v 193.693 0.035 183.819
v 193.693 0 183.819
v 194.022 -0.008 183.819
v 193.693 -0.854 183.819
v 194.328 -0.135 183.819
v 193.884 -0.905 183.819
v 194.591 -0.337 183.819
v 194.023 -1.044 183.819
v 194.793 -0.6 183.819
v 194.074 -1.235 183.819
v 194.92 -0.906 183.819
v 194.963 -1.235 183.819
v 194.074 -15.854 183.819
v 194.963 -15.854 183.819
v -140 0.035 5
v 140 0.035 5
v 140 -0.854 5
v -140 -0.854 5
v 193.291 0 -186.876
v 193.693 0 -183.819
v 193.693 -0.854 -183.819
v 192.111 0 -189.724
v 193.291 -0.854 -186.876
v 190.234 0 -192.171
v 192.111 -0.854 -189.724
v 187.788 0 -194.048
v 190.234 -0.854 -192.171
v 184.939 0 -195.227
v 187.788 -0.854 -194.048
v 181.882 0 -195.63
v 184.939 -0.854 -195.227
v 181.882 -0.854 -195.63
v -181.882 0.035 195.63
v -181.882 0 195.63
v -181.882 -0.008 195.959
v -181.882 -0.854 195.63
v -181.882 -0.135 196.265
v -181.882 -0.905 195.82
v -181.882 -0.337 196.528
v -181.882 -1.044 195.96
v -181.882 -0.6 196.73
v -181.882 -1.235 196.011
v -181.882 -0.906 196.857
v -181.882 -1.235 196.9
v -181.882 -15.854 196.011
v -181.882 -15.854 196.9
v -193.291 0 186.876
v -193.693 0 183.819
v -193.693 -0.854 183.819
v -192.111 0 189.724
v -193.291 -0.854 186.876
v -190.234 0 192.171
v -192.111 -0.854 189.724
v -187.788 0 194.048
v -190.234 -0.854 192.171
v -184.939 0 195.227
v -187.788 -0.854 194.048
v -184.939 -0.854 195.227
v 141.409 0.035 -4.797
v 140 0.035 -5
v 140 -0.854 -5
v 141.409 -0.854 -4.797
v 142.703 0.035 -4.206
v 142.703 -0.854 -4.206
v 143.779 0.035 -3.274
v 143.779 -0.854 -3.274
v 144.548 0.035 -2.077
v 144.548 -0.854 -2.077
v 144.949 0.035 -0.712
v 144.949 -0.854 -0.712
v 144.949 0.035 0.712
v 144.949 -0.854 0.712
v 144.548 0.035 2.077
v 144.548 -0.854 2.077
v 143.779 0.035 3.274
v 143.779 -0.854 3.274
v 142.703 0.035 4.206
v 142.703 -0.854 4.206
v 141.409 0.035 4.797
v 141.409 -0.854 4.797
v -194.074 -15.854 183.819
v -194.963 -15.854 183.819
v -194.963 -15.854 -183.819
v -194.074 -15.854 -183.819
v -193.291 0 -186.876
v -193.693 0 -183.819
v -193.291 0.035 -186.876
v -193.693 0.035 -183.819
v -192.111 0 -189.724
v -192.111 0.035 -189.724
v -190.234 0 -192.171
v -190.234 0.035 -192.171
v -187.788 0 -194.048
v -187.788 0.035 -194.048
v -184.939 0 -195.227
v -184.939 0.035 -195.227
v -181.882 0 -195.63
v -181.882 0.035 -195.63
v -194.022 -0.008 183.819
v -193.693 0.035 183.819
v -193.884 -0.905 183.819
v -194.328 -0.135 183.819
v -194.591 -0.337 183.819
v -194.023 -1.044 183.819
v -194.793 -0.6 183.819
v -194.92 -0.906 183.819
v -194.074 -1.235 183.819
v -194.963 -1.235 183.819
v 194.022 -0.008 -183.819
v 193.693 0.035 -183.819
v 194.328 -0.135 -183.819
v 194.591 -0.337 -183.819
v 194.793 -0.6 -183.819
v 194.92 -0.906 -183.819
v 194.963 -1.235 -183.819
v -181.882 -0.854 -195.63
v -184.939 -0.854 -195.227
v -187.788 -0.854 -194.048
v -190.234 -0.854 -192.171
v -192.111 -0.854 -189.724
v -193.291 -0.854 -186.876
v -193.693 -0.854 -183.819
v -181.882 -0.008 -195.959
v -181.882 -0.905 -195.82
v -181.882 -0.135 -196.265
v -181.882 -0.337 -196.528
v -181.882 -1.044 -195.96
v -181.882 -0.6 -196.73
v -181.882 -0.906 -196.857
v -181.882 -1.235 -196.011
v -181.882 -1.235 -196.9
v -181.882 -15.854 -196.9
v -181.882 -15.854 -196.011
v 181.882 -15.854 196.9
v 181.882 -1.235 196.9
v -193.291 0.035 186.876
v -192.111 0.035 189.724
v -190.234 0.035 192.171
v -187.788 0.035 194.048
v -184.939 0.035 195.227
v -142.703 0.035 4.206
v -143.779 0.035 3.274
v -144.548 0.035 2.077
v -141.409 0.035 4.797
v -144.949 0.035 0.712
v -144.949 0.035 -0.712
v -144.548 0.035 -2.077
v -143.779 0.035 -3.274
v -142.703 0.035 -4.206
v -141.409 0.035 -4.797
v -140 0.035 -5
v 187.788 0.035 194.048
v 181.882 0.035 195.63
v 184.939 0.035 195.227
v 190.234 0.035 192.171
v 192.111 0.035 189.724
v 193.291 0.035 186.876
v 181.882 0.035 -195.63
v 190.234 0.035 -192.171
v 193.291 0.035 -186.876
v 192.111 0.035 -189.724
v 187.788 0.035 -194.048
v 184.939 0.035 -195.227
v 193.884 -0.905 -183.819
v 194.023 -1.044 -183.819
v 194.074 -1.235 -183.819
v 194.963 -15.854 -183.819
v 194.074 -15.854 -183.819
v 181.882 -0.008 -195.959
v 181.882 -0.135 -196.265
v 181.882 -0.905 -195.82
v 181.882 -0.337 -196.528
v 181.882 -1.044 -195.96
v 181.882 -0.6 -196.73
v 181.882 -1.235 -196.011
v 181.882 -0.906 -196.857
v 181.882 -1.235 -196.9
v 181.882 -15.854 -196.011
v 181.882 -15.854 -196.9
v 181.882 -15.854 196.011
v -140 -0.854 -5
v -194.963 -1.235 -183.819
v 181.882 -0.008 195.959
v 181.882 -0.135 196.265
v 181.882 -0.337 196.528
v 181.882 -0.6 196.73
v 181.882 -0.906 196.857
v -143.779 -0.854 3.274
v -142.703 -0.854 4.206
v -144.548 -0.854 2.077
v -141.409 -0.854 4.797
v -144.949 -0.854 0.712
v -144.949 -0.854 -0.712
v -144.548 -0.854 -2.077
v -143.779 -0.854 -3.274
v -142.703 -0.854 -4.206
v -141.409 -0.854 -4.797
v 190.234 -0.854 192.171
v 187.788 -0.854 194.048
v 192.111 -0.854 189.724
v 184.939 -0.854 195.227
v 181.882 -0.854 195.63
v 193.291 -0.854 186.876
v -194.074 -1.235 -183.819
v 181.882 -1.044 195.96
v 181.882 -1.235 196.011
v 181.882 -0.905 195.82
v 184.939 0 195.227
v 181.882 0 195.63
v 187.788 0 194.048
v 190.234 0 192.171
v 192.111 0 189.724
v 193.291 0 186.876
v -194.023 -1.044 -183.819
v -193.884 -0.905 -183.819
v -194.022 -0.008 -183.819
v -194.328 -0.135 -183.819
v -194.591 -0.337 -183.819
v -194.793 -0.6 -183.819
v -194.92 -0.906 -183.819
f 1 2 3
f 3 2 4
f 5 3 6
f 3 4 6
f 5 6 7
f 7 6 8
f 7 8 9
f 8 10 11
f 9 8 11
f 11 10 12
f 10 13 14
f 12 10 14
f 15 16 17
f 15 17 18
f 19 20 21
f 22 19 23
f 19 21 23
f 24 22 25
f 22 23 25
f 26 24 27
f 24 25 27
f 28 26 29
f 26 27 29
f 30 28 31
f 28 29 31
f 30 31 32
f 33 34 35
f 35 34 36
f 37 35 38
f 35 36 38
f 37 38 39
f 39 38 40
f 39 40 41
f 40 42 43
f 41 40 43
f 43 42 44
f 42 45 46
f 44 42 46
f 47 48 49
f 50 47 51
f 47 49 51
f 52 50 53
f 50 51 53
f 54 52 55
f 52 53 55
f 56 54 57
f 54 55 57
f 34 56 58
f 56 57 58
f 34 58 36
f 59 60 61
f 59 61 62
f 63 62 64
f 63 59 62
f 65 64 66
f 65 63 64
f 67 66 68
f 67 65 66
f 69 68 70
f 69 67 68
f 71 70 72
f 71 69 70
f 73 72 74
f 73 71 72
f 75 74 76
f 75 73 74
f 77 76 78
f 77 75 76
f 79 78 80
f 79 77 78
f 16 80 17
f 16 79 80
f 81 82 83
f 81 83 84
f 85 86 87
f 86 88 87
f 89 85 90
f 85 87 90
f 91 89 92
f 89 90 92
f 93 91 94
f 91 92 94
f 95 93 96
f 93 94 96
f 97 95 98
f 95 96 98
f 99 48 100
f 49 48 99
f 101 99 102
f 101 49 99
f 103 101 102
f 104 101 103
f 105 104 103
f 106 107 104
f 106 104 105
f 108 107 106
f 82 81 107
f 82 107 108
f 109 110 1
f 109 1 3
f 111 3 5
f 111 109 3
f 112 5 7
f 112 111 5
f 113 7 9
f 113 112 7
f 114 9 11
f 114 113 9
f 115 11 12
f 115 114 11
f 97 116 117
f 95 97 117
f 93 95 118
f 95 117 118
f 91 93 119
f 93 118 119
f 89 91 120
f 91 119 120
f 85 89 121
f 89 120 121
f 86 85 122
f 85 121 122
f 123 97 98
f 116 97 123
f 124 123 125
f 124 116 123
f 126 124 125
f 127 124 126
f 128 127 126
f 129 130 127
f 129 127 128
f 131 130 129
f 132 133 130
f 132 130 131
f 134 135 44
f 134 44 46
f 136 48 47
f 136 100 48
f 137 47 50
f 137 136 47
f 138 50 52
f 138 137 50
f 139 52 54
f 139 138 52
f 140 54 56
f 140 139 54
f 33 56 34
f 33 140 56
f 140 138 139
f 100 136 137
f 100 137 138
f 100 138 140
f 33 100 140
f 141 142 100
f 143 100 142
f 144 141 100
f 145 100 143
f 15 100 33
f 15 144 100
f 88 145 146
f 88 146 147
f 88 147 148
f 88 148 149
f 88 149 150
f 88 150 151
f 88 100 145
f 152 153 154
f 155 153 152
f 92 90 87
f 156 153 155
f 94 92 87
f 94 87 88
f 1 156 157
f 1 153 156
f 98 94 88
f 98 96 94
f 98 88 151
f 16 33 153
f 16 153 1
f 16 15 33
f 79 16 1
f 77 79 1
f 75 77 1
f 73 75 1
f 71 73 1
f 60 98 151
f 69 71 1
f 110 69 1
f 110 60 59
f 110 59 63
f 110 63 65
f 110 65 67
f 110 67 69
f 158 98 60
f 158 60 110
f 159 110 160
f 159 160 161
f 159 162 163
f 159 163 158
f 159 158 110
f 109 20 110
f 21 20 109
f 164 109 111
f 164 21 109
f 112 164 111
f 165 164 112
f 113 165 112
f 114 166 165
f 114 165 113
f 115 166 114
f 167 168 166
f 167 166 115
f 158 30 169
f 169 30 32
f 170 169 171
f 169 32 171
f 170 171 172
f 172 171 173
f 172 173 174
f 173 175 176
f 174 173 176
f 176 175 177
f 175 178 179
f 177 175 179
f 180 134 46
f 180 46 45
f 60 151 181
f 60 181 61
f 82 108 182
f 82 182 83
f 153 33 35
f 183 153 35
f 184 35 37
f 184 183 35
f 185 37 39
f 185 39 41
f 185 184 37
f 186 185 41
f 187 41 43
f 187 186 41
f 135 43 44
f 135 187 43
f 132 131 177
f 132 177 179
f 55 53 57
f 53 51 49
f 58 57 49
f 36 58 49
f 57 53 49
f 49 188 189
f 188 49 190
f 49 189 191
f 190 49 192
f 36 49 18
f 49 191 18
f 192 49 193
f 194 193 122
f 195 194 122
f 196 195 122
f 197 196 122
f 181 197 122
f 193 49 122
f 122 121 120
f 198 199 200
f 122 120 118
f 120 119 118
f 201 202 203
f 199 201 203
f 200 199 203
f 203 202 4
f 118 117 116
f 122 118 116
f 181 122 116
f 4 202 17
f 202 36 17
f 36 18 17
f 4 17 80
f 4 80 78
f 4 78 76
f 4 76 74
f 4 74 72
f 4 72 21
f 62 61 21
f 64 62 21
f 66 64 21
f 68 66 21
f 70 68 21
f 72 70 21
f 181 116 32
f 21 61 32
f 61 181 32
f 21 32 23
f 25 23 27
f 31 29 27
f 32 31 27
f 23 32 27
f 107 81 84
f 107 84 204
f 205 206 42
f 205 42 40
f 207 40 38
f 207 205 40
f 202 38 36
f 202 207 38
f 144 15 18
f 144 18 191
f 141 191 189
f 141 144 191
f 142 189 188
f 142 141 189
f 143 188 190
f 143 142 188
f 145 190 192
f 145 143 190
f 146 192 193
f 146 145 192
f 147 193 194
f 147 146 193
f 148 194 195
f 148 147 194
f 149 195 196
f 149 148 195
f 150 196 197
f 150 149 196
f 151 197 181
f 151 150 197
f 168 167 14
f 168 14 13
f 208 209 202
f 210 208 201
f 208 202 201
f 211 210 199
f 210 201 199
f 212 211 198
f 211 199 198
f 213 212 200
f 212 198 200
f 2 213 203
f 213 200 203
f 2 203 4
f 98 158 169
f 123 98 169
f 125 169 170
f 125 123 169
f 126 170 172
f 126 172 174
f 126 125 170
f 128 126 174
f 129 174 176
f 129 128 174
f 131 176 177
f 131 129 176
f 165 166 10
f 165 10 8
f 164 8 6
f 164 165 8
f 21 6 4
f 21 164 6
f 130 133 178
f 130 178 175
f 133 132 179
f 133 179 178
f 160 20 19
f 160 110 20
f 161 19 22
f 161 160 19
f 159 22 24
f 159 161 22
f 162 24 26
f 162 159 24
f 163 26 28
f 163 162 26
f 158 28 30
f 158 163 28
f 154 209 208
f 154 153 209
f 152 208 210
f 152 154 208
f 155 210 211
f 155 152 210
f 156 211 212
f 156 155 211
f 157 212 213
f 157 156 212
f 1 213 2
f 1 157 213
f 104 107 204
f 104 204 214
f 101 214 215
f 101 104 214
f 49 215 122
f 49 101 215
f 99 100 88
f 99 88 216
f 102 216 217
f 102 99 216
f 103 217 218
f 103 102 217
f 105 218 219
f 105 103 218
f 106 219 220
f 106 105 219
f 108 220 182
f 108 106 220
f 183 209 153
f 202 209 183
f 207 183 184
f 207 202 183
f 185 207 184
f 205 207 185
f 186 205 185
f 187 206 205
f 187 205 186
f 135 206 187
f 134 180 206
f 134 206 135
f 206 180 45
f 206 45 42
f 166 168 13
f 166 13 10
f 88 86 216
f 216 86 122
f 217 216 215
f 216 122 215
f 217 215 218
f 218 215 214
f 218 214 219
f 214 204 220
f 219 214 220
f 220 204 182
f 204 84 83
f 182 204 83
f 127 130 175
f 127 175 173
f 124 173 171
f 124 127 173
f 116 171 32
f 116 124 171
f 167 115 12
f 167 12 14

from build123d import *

# Parameters (mm, degrees)
SKETCH1_W                 = 387.38683
SKETCH1_H                 = 391.2598474
BOSS_EXTRUDE1_DEPTH       = 0.035
FILLET1_R                 = 11.811
CONVERT_SOLID1_START      = -0.854
CONVERT_SOLID1_DEPTH      = 0.854
CUT_EXTRUDE1_DEPTH        = 0.889
EDGE_FLANGE1_DEPTH        = 367.6378474
EDGE_FLANGE1_BEND_DEPTH   = 363.76483
EDGE_FLANGE1_BEND_2_DEPTH = 367.6378474
EDGE_FLANGE1_BEND_3_DEPTH = 363.76483


# Read off the part's stored shape, not the designer's step: Convert-Solid1
# Sheet-metal steps are written as plain solids
with BuildPart() as part:
    # Sketch1 → Boss-Extrude1 (new body)
    with BuildSketch(Plane(origin=(0, 0, 0), x_dir=(1, 0, 0), z_dir=(0, 1, 0))):
        Rectangle(SKETCH1_W, SKETCH1_H)
    extrude(amount=BOSS_EXTRUDE1_DEPTH)

    # Fillet1
    fillet1_edges = [part.edges().sort_by_distance(p)[0] for p in [
        (193.693415, 0.0175, -195.6299237),
        (193.693415, 0.0175, 195.6299237),
        (-193.693415, 0.0175, 195.6299237),
        (-193.693415, 0.0175, -195.6299237),
    ]]
    fillet(fillet1_edges, radius=FILLET1_R)

    # Convert-Solid1 outline → Convert-Solid1 (add)
    with BuildSketch(Plane(origin=(0, 0, 0), x_dir=(1, 0, 0), z_dir=(0, 1, 0)).offset(CONVERT_SOLID1_START)):
        with BuildLine():
            ThreePointArc((193.693415, 183.8189237), (190.234053193, 192.170561893), (181.882415, 195.6299237))
            Line((181.882415, 195.6299237), (-181.882415, 195.6299237))
            ThreePointArc((-181.882415, 195.6299237), (-190.234053193, 192.170561893), (-193.693415, 183.8189237))
            Line((-193.693415, 183.8189237), (-193.693415, -183.8189237))
            ThreePointArc((-193.693415, -183.8189237), (-190.234053193, -192.170561893), (-181.882415, -195.6299237))
            Line((-181.882415, -195.6299237), (181.882415, -195.6299237))
            ThreePointArc((181.882415, -195.6299237), (190.234053193, -192.170561893), (193.693415, -183.8189237))
            Line((193.693415, -183.8189237), (193.693415, 183.8189237))
        make_face()
    extrude(amount=CONVERT_SOLID1_DEPTH)

    # Sketch2 → Cut-Extrude1 (cut)
    with BuildSketch(Plane(origin=(0, 0.035, 0), x_dir=(1, 0, 0), z_dir=(0, 1, 0))):
        with BuildLine():
            Line((-140, 5), (140, 5))
            ThreePointArc((140, 5), (145, 0), (140, -5))
            Line((140, -5), (-140, -5))
            ThreePointArc((-140, -5), (-145, 0), (-140, 5))
        make_face()
    extrude(amount=-CUT_EXTRUDE1_DEPTH, mode=Mode.SUBTRACT)

    # Edge-Flange1 section (across the edge) → Edge-Flange1 (add)
    with BuildSketch(Plane(origin=(-194.074415, -0.854, 183.8189237), x_dir=(1, 0, 0), z_dir=(0, 0, -1))):
        with BuildLine():
            Line((-0.889, 0.381), (-0.889, 15))
            Line((-0.889, 15), (0, 15))
            Line((0, 15), (0, 0.381))
            ThreePointArc((0, 0.381), (0.111592316, 0.111592316), (0.381, 0))
            Line((0.381, 0), (0.381, -0.889))
            ThreePointArc((0.381, -0.889), (-0.517025612, -0.517025612), (-0.889, 0.381))
        make_face()
    extrude(amount=EDGE_FLANGE1_DEPTH)

    # Edge-Flange1 section 2 (across the edge) → Edge-Flange1 bend (add)
    with BuildSketch(Plane(origin=(181.882415, -0.854, 196.0109237), x_dir=(0, 0, -1), z_dir=(-1, 0, 0))):
        with BuildLine():
            Line((-0.889, 0.381), (-0.889, 15))
            Line((-0.889, 15), (0, 15))
            Line((0, 15), (0, 0.381))
            ThreePointArc((0, 0.381), (0.111592316, 0.111592316), (0.381, 0))
            Line((0.381, 0), (0.381, -0.889))
            ThreePointArc((0.381, -0.889), (-0.517025612, -0.517025612), (-0.889, 0.381))
        make_face()
    extrude(amount=EDGE_FLANGE1_BEND_DEPTH)

    # Edge-Flange1 section 3 (across the edge) → Edge-Flange1 bend 2 (add)
    with BuildSketch(Plane(origin=(194.074415, -0.854, -183.8189237), x_dir=(-1, 0, 0), z_dir=(0, 0, 1))):
        with BuildLine():
            Line((-0.889, 0.381), (-0.889, 15))
            Line((-0.889, 15), (0, 15))
            Line((0, 15), (0, 0.381))
            ThreePointArc((0, 0.381), (0.111592316, 0.111592316), (0.381, 0))
            Line((0.381, 0), (0.381, -0.889))
            ThreePointArc((0.381, -0.889), (-0.517025612, -0.517025612), (-0.889, 0.381))
        make_face()
    extrude(amount=EDGE_FLANGE1_BEND_2_DEPTH)

    # Edge-Flange1 section 4 (across the edge) → Edge-Flange1 bend 3 (add)
    with BuildSketch(Plane(origin=(-181.882415, -0.854, -196.0109237), x_dir=(0, 0, 1), z_dir=(1, 0, 0))):
        with BuildLine():
            Line((-0.889, 0.381), (-0.889, 15))
            Line((-0.889, 15), (0, 15))
            Line((0, 15), (0, 0.381))
            ThreePointArc((0, 0.381), (0.111592316, 0.111592316), (0.381, 0))
            Line((0.381, 0), (0.381, -0.889))
            ThreePointArc((0.381, -0.889), (-0.517025612, -0.517025612), (-0.889, 0.381))
        make_face()
    extrude(amount=EDGE_FLANGE1_BEND_3_DEPTH)


solid = part.part
